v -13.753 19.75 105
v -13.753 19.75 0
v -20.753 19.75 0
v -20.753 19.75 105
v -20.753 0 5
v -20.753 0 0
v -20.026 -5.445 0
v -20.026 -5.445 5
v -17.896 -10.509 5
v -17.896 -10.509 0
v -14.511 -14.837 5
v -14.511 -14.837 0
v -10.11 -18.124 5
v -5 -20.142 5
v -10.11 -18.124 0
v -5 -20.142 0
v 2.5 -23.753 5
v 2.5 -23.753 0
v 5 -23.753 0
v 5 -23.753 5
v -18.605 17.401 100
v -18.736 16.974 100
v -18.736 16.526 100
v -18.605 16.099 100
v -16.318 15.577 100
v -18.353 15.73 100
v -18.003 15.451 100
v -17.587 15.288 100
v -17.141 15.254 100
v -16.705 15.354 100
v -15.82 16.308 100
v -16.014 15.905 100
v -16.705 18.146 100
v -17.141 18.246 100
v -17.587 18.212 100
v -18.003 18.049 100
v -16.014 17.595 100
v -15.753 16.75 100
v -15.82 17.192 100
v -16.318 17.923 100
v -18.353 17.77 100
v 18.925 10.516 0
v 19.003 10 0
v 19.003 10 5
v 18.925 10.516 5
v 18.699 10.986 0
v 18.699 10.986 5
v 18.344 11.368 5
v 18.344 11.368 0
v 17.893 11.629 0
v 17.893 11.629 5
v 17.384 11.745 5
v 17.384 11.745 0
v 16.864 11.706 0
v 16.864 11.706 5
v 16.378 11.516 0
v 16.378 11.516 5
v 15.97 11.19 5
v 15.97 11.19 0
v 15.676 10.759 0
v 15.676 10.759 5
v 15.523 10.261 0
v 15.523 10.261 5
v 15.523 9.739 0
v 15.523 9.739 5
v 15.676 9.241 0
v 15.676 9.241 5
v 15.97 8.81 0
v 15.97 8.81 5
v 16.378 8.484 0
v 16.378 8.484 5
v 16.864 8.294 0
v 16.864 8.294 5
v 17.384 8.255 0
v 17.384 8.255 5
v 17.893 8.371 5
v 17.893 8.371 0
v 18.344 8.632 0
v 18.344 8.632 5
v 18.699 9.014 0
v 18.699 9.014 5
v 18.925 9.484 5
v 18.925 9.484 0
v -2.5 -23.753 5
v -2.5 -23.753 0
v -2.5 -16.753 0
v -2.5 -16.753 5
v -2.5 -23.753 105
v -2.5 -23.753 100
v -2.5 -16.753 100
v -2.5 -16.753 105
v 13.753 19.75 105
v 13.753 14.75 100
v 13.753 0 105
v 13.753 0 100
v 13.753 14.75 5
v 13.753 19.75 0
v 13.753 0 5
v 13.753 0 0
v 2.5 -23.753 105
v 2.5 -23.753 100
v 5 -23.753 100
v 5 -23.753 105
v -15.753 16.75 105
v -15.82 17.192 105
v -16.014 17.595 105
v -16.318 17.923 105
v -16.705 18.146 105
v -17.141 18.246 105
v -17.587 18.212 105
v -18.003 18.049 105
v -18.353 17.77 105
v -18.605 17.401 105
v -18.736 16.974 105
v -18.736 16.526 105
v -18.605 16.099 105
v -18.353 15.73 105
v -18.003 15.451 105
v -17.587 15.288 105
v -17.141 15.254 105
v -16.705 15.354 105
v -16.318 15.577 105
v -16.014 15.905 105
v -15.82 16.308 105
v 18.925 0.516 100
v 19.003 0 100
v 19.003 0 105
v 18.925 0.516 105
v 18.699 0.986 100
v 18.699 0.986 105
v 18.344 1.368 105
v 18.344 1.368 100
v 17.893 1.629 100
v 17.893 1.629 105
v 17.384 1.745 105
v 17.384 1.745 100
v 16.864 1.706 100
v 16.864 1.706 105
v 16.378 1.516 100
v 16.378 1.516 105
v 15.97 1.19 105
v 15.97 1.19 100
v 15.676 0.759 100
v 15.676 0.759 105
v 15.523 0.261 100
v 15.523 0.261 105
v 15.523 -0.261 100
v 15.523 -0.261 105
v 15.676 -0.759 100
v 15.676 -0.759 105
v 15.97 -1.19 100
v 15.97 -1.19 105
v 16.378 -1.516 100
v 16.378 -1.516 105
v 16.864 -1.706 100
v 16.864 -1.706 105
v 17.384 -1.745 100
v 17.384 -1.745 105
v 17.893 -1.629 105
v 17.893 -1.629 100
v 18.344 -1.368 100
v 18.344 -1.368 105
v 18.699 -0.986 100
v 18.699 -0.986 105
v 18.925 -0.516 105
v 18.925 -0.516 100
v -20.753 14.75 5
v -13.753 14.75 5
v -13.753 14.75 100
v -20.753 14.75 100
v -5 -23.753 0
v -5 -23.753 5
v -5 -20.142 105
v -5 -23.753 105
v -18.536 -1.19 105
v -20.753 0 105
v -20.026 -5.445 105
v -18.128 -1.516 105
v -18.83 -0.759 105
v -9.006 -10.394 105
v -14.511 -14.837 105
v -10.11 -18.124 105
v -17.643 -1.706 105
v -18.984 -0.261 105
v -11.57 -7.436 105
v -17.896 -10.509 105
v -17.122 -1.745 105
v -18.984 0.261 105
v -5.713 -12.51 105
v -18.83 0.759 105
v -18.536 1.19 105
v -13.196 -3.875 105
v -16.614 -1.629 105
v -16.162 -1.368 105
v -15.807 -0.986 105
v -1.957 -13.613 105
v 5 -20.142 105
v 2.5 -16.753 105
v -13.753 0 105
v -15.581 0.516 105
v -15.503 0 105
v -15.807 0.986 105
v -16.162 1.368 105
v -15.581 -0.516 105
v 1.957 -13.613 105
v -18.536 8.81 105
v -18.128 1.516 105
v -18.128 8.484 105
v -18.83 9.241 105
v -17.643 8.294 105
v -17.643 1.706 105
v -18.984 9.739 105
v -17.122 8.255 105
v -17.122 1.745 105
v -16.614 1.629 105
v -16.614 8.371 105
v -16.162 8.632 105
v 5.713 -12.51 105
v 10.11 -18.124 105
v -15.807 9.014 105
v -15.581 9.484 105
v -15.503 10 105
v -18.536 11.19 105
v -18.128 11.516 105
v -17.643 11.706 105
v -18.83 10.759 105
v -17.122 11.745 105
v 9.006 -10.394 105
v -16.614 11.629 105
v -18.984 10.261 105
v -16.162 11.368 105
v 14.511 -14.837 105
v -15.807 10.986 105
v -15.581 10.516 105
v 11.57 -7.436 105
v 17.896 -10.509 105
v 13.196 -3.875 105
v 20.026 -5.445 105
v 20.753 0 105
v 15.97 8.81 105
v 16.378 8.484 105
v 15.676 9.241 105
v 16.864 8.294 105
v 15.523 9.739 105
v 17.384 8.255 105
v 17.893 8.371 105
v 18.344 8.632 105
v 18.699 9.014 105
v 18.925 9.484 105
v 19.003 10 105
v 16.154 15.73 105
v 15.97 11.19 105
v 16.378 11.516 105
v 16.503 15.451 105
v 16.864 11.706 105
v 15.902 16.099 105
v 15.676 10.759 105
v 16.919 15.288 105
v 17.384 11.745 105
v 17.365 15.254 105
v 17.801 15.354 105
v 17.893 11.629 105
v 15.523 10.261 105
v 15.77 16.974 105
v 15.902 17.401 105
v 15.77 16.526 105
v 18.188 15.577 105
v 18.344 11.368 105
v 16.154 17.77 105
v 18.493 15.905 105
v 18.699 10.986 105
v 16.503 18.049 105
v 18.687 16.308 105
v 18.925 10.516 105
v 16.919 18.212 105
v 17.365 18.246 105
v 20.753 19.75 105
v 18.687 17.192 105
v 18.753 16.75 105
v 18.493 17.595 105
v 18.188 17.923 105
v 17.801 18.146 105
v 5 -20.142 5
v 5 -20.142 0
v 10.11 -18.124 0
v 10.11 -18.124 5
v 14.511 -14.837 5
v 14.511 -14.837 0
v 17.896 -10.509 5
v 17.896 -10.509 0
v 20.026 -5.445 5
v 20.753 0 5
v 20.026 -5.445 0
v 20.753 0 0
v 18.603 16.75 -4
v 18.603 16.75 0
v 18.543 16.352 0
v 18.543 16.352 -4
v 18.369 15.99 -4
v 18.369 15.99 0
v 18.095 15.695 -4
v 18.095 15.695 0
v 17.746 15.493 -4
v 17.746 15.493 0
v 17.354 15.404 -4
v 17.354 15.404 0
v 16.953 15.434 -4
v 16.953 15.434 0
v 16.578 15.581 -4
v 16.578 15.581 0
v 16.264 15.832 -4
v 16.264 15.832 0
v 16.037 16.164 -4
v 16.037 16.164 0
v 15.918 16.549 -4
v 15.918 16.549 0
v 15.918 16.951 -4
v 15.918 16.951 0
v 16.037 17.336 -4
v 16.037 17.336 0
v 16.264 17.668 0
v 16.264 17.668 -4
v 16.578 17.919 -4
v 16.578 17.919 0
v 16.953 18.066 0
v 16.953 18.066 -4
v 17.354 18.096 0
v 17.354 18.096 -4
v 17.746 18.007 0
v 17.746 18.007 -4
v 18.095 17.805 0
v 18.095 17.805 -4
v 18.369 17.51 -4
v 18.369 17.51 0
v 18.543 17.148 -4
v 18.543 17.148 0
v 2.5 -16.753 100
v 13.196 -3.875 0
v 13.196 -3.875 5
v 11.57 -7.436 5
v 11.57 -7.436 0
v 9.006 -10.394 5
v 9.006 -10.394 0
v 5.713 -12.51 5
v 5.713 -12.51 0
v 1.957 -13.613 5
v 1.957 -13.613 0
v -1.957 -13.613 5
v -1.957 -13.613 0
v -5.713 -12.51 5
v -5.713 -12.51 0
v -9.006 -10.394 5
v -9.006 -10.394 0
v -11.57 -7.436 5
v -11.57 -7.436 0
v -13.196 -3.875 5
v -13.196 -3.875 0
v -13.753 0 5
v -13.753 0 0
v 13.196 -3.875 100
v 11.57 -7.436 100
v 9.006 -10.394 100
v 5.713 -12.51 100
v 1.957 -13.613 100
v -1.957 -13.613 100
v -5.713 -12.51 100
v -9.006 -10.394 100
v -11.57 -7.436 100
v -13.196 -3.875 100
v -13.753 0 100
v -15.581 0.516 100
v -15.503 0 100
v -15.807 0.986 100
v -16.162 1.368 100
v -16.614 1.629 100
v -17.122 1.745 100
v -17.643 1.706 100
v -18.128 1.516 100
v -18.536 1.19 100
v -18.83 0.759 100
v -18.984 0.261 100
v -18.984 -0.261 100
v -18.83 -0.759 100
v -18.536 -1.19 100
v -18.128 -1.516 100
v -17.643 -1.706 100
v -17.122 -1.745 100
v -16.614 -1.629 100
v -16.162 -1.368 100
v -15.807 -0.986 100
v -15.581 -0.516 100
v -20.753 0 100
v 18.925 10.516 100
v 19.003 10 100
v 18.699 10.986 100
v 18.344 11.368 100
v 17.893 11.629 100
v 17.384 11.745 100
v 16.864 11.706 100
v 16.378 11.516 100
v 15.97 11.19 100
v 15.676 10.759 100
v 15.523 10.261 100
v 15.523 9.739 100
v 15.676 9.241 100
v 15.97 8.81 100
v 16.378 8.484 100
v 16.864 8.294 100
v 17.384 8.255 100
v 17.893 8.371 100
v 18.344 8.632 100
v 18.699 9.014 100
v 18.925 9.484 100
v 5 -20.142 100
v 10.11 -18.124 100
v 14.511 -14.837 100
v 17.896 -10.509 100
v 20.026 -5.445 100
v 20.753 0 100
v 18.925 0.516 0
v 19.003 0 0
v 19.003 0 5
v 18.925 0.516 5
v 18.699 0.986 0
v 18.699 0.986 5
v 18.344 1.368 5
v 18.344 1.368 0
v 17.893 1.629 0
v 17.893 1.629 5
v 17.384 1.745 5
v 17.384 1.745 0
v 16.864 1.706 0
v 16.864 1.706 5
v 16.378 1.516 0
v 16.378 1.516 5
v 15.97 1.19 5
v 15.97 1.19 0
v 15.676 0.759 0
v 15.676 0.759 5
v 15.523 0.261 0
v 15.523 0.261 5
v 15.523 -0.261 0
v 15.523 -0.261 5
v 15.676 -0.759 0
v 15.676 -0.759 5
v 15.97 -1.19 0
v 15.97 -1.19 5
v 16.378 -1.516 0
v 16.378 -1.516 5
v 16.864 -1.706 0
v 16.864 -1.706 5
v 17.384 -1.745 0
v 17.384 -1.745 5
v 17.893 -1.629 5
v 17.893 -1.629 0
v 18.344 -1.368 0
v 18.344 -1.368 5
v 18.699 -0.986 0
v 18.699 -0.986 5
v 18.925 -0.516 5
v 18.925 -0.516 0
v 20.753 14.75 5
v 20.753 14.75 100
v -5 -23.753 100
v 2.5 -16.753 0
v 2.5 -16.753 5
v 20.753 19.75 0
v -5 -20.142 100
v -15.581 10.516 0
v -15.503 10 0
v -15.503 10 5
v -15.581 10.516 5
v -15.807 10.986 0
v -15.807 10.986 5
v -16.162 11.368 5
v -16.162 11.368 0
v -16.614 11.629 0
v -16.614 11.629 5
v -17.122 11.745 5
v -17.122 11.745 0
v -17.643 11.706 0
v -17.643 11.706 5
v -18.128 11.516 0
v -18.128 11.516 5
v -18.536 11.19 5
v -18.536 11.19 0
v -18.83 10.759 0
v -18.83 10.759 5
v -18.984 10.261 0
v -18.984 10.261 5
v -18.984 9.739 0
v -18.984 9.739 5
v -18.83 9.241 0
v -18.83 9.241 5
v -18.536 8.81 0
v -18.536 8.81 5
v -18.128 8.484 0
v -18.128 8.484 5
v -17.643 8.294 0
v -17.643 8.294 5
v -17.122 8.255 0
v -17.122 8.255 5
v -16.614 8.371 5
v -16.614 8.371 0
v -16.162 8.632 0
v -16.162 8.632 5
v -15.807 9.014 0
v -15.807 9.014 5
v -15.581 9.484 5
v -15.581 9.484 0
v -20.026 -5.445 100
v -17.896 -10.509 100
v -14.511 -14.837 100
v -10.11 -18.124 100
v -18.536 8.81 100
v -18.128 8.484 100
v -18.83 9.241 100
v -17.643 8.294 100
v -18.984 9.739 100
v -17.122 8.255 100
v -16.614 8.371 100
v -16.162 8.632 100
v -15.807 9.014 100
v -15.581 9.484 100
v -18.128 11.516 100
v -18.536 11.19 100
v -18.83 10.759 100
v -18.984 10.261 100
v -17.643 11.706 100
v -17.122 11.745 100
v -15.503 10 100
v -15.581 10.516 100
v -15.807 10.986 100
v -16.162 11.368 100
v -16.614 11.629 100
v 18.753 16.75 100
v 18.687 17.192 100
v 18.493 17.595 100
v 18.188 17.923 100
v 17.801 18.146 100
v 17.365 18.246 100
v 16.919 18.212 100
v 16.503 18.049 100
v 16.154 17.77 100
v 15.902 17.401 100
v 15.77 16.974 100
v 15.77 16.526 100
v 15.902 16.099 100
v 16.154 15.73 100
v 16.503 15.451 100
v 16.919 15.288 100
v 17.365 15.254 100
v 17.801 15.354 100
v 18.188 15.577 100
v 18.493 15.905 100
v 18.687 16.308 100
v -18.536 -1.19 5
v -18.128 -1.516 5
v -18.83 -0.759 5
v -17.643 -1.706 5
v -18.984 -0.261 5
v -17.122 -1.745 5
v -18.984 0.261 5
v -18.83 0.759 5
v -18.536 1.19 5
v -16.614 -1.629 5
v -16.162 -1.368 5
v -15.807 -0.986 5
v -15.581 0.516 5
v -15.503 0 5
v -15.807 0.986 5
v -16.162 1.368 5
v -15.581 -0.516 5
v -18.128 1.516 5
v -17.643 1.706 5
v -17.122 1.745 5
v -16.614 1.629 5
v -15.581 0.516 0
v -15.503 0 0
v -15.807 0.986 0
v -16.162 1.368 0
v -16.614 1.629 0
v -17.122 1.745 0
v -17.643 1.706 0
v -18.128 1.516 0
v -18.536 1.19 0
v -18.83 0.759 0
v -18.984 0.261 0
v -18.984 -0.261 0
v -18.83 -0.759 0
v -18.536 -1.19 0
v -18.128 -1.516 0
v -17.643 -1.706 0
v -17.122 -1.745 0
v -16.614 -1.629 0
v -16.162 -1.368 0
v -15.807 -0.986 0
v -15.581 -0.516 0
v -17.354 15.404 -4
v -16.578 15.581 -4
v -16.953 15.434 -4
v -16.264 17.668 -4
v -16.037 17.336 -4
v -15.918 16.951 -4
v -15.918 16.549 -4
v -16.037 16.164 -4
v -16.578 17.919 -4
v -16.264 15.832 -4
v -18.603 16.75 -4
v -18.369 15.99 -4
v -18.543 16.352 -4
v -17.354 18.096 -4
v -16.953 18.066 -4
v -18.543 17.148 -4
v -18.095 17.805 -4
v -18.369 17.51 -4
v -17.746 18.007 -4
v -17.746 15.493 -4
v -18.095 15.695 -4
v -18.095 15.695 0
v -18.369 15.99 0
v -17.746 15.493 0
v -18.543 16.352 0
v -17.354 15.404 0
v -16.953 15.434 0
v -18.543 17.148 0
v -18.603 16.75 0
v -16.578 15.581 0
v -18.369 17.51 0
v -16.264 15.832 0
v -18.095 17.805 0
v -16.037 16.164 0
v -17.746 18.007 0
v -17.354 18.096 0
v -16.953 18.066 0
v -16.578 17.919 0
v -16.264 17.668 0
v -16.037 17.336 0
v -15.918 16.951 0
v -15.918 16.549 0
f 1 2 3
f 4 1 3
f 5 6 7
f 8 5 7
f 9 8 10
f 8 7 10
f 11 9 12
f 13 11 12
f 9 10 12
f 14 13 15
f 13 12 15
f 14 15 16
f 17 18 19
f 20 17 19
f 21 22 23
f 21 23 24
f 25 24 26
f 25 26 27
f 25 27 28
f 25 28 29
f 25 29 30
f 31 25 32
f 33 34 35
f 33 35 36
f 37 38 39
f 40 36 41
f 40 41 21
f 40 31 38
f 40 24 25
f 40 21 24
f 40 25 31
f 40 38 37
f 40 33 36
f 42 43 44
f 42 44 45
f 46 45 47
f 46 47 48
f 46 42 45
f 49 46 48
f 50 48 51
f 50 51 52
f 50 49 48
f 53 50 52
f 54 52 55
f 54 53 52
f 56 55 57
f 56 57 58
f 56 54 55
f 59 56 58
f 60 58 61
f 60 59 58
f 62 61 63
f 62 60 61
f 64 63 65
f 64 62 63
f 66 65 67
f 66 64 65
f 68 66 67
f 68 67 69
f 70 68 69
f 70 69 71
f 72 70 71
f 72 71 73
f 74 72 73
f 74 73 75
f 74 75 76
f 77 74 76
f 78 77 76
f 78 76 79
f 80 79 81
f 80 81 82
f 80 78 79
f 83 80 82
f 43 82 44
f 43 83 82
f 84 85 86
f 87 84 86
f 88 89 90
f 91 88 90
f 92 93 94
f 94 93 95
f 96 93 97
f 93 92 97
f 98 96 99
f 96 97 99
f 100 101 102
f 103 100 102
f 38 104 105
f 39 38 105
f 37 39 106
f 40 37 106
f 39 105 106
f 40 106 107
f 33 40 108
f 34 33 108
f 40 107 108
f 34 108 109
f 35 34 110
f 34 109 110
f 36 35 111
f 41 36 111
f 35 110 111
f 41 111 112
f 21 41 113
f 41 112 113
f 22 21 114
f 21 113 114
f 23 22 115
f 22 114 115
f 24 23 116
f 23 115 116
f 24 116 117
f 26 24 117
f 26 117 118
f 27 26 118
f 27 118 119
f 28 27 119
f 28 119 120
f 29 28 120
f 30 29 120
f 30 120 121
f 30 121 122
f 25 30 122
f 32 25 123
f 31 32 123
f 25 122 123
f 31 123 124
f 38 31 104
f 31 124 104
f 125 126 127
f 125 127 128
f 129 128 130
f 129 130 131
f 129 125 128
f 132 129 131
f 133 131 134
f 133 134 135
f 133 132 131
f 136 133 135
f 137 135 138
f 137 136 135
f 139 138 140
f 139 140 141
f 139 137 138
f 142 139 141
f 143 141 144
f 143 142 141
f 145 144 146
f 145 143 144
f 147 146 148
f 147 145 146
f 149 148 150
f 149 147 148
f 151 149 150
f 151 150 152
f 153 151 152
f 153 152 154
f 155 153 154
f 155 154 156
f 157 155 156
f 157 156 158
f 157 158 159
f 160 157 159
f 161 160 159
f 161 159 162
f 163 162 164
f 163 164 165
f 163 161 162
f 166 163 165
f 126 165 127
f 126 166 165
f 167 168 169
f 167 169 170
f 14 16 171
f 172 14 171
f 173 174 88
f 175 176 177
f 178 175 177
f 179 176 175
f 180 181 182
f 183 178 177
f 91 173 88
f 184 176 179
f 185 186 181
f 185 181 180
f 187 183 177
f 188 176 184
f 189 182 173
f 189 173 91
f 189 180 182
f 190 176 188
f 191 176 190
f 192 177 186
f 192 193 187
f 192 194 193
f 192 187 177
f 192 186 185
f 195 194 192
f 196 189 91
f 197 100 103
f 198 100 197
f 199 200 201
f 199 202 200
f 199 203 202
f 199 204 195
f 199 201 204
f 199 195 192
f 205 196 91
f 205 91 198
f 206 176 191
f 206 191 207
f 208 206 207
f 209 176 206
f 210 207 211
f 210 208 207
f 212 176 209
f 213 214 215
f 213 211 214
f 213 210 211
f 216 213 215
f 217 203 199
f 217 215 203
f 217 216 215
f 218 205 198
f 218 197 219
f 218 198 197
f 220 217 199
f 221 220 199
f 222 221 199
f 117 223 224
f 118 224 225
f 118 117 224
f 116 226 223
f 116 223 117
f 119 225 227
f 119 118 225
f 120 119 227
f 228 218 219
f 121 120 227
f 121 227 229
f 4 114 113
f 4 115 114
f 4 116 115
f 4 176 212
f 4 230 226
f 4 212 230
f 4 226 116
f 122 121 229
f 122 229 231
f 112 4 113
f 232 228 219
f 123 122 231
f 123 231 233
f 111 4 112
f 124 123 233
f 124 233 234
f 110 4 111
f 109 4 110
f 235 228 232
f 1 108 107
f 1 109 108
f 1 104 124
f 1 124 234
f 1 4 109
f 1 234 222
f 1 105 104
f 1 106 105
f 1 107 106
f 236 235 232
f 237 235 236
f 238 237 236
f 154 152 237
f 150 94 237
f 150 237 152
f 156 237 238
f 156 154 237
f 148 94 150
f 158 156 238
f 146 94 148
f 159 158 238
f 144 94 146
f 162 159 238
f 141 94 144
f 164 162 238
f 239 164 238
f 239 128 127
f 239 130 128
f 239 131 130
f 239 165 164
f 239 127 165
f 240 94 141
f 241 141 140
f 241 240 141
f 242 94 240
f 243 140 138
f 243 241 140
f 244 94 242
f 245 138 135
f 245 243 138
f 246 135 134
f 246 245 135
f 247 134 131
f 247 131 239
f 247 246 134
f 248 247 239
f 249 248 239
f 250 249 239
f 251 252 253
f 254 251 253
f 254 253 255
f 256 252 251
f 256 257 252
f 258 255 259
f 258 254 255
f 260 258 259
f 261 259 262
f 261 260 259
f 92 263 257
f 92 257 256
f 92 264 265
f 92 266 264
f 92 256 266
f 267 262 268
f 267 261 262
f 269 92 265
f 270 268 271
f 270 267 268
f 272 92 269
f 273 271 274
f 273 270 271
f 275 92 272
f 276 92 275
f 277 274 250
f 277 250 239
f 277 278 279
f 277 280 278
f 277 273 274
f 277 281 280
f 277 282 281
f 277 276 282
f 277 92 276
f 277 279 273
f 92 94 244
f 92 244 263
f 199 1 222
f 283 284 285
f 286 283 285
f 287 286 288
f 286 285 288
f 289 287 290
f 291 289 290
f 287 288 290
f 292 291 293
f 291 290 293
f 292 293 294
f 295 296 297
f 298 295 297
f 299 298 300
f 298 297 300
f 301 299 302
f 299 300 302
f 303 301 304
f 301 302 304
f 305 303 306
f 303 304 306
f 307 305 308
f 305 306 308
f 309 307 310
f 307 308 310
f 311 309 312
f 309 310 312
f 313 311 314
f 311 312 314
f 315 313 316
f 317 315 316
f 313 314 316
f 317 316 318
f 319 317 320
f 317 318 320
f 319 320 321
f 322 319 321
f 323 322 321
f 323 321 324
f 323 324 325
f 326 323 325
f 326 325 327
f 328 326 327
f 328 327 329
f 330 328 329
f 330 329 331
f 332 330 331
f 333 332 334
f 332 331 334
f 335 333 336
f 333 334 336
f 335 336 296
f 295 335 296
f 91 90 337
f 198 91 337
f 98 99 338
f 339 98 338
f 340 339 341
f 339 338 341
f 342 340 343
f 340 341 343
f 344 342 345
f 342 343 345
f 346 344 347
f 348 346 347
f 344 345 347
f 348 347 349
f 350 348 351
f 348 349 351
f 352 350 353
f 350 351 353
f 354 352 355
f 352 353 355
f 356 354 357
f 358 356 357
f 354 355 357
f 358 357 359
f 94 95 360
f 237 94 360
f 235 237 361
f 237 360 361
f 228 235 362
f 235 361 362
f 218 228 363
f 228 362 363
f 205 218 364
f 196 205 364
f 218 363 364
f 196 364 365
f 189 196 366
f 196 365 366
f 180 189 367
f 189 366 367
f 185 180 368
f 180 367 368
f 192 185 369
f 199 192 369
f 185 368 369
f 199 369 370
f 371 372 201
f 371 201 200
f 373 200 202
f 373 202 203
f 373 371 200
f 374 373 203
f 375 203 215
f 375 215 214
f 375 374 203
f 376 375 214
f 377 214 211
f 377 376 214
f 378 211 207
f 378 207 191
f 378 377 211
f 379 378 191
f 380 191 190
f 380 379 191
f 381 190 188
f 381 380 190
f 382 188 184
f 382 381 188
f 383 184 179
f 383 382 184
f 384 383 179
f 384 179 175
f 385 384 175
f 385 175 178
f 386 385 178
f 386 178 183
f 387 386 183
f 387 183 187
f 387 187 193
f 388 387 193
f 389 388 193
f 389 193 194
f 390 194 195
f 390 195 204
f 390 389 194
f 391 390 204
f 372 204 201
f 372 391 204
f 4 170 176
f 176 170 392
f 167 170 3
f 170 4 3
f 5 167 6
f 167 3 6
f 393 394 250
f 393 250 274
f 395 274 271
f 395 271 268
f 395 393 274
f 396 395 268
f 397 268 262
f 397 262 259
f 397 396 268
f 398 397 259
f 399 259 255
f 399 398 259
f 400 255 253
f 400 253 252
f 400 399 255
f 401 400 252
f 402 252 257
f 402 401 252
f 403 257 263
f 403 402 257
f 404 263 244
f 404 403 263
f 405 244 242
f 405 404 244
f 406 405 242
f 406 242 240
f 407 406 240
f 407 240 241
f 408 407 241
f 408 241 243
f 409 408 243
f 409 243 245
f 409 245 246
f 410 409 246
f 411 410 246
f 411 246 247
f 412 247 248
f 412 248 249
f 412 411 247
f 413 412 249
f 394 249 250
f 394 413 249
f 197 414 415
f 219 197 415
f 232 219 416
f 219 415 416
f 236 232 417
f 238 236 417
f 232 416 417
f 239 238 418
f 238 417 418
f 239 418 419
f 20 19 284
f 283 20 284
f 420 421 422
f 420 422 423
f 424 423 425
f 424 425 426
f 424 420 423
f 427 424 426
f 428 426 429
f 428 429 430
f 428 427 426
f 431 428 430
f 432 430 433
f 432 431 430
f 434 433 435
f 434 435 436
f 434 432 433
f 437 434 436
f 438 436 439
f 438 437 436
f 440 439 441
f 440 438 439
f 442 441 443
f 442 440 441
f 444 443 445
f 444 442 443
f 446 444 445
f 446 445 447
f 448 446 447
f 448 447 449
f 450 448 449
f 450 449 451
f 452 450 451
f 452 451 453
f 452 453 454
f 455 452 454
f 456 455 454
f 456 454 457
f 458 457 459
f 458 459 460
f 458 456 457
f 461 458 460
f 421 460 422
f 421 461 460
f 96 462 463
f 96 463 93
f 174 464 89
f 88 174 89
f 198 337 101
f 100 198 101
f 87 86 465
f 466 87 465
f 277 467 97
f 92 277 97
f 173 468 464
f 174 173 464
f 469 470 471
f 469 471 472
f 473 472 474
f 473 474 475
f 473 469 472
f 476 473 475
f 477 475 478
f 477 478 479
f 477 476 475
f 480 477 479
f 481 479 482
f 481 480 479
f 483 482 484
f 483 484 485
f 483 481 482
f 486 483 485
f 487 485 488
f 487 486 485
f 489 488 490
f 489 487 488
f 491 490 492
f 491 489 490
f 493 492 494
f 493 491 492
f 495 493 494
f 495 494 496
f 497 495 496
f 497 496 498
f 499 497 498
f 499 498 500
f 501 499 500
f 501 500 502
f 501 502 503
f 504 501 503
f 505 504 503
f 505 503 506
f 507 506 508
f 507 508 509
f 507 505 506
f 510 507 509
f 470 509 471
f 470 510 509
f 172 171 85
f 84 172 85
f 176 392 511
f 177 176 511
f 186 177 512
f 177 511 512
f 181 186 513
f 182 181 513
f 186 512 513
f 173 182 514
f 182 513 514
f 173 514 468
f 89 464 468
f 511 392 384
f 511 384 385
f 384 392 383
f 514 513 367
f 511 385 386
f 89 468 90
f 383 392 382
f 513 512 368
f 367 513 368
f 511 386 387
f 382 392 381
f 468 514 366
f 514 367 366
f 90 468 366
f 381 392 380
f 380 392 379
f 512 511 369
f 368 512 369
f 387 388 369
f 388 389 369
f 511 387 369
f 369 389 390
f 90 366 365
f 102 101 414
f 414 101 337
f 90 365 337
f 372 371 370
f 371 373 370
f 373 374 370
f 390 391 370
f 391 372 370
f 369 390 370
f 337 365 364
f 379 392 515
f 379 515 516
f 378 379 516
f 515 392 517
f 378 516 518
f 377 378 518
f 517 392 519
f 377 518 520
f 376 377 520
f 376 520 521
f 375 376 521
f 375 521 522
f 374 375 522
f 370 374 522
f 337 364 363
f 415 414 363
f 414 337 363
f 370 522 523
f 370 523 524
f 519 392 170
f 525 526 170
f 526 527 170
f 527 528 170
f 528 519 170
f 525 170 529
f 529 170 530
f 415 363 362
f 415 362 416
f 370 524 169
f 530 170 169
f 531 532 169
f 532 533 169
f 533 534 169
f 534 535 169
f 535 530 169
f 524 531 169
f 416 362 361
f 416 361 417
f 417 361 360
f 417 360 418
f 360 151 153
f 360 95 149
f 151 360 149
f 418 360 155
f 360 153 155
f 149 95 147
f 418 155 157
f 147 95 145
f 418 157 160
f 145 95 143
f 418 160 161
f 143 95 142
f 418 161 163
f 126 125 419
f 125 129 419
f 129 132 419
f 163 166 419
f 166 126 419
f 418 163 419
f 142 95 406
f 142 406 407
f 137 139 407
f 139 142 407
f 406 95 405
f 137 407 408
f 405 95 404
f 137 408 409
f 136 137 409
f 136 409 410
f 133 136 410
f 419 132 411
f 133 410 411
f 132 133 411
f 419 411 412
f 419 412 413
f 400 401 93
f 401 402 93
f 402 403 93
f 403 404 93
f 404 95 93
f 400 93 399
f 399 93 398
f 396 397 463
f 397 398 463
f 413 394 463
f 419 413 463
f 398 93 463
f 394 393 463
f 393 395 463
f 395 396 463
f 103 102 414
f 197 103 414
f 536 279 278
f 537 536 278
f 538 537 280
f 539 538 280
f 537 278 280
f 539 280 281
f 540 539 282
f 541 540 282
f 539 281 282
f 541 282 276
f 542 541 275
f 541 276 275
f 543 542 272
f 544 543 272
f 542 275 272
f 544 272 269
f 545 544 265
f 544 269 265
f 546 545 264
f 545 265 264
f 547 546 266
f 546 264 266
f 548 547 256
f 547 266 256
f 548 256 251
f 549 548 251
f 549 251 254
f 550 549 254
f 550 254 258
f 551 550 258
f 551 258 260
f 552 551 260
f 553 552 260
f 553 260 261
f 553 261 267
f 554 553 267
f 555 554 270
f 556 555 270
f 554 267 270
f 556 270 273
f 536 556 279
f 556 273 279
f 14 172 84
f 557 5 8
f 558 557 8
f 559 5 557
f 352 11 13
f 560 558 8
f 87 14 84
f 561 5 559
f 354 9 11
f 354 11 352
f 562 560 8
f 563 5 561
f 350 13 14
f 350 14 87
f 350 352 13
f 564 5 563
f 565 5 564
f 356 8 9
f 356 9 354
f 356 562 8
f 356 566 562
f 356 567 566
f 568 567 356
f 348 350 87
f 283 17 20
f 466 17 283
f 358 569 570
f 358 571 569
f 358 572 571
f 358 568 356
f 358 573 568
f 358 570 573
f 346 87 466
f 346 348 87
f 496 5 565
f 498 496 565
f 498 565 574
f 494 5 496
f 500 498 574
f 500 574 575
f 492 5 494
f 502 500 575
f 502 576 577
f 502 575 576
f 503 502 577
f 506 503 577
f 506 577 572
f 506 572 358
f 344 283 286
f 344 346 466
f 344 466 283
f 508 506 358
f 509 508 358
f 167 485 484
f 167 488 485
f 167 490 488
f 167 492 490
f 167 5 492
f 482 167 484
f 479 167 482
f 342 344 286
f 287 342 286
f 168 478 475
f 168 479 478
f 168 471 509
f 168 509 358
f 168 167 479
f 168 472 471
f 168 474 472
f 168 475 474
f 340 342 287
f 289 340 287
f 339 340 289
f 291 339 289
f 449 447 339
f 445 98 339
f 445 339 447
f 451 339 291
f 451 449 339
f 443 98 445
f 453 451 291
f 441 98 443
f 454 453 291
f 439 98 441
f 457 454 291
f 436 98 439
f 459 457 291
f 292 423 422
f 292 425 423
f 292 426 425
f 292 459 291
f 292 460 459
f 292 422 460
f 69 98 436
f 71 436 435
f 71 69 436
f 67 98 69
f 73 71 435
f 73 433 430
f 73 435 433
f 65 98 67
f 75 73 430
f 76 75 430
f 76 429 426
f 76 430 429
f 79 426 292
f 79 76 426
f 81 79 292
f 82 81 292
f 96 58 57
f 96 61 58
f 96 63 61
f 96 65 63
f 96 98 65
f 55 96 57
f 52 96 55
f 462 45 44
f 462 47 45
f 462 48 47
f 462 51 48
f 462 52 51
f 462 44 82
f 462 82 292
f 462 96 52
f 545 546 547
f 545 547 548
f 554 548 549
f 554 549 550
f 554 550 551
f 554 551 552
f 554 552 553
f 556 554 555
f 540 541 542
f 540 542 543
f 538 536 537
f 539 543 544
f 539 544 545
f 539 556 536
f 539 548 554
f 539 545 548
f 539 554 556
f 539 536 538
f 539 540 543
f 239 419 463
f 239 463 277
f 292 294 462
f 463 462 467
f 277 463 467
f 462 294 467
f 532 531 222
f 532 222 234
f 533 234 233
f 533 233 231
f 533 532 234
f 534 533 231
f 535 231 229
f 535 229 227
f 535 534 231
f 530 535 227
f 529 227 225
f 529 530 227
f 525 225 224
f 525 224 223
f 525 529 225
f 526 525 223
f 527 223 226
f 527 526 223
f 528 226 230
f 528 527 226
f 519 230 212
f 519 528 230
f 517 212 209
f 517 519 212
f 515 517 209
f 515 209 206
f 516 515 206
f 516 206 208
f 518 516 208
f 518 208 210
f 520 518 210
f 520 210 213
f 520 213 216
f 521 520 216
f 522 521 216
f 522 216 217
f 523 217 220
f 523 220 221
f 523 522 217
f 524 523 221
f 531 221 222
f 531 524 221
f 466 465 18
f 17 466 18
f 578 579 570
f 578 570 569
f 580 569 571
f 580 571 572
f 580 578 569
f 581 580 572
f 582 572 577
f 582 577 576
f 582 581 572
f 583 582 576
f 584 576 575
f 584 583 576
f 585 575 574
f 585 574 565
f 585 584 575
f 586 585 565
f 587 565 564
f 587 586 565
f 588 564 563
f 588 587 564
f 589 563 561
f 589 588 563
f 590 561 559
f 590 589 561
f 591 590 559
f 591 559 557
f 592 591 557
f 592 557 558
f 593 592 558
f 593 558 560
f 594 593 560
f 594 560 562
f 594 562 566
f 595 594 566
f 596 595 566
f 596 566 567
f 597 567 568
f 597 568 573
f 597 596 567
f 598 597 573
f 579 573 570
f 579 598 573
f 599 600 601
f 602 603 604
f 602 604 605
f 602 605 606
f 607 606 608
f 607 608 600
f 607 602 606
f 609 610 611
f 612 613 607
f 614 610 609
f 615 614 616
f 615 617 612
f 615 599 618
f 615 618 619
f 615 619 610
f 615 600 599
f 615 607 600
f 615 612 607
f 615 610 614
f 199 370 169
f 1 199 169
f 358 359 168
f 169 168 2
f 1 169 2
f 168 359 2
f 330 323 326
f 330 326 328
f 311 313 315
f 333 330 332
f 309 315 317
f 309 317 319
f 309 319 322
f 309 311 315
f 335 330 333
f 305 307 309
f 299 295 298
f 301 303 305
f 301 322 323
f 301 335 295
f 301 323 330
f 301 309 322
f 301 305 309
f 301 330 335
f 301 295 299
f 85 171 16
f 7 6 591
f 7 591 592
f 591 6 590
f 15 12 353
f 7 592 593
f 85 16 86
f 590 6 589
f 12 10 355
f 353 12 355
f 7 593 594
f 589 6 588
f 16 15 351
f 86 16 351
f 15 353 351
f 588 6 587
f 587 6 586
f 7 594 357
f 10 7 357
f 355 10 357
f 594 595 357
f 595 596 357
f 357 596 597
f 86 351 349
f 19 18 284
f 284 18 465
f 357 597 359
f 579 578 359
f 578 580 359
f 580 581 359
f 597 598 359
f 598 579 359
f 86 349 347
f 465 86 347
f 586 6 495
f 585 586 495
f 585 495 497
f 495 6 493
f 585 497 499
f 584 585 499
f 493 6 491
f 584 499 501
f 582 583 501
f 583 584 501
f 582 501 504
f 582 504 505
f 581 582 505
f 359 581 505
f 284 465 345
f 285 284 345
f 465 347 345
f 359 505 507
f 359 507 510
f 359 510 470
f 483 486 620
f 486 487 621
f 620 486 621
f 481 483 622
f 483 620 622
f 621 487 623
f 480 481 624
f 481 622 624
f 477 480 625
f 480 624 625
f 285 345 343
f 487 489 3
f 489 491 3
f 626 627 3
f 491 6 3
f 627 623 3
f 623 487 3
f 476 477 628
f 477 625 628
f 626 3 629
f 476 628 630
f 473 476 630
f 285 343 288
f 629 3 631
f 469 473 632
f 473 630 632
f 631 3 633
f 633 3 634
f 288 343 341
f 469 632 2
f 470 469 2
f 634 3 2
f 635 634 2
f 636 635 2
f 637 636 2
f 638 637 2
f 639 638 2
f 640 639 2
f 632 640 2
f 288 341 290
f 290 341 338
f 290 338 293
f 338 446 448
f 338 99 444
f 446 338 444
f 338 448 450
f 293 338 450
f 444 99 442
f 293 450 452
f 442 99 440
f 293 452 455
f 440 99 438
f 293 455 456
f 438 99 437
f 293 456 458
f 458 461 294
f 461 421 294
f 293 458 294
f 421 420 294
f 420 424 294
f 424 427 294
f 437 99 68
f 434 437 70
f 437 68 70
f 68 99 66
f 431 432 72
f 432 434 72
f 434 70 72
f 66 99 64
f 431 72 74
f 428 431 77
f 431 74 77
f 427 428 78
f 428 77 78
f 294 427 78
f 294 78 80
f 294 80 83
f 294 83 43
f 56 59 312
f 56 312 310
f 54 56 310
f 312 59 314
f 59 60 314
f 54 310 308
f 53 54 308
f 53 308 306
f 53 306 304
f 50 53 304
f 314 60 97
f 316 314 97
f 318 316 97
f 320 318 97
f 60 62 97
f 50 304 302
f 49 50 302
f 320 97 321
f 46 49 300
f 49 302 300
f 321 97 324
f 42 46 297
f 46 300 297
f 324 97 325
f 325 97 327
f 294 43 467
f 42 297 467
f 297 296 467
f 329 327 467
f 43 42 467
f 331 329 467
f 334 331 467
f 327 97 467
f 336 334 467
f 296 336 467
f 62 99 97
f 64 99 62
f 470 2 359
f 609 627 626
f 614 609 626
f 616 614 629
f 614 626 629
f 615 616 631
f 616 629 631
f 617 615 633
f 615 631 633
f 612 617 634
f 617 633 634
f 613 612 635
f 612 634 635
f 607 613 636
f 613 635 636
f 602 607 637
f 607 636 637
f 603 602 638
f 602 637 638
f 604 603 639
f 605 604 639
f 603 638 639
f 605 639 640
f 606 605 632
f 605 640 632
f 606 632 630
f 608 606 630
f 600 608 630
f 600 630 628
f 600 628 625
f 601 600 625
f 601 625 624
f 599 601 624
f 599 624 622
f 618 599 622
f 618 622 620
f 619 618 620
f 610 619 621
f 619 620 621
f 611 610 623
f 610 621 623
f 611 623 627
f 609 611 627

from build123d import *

# Parameters (mm, degrees)
SKETCH1_R           = 1.75
BOSS_EXTRUDE1_DEPTH = 5
SKETCH2_R           = 1.35
BOSS_EXTRUDE2_DEPTH = 4
SKETCH4_W           = 7
SKETCH4_H           = 5
BOSS_EXTRUDE3_DEPTH = 105
BOSS_EXTRUDE4_START = -5
SKETCH5_R           = 1.75
BOSS_EXTRUDE4_DEPTH = 5
SKETCH6_R           = 1.35
CUT_EXTRUDE1_DEPTH  = 5
SKETCH8_R           = 1.5
CUT_EXTRUDE3_DEPTH  = 5


with BuildPart() as part:
    # Sketch1 → Boss-Extrude1 (new body)
    with BuildSketch(Plane.XY):
        with BuildLine():
            Line((-20.753194099, 19.75), (-20.753194099, 0))
            ThreePointArc((-20.753194099, 0), (-16.34718685, -12.785325472), (-5, -20.141873431))
            Line((-5, -20.141873431), (-5, -23.753194099))
            Line((-5, -23.753194099), (-2.5, -23.753194099))
            Line((-2.5, -23.753194099), (-2.5, -16.753194099))
            Line((-2.5, -16.753194099), (2.5, -16.753194099))
            Line((2.5, -16.753194099), (2.5, -23.753194099))
            Line((2.5, -23.753194099), (5, -23.753194099))
            Line((5, -23.753194099), (5, -20.141873431))
            ThreePointArc((5, -20.141873431), (16.34718685, -12.785325472), (20.753194099, 0))
            Line((20.753194099, 0), (20.753194099, 19.75))
            Line((20.753194099, 19.75), (13.753194099, 19.75))
            Line((13.753194099, 19.75), (13.753194099, 0))
            ThreePointArc((13.753194099, 0), (0, -13.753194099), (-13.753194099, 0))
            Line((-13.753194099, 0), (-13.753194099, 19.75))
            Line((-13.753194099, 19.75), (-20.753194099, 19.75))
        make_face()
        with Locations((-17.253194099, 10)):
            Circle(SKETCH1_R, mode=Mode.SUBTRACT)
        with Locations((-17.253194099, 0)):
            Circle(SKETCH1_R, mode=Mode.SUBTRACT)
        with Locations((17.253194099, 0)):
            Circle(SKETCH1_R, mode=Mode.SUBTRACT)
        with Locations((17.253194099, 10)):
            Circle(SKETCH1_R, mode=Mode.SUBTRACT)
    extrude(amount=BOSS_EXTRUDE1_DEPTH)

    # Sketch2 → Boss-Extrude2 (add)
    with BuildSketch(Plane(origin=(0, 0, 0), x_dir=(-1, 0, 0), z_dir=(0, 0, -1))):
        with Locations((17.253194099, 16.75)):
            Circle(SKETCH2_R)
        with Locations(Location((-17.253194099, 16.75, 0), (0, 0, 180))):
            Circle(SKETCH2_R)
    extrude(amount=BOSS_EXTRUDE2_DEPTH)

    # Sketch4 → Boss-Extrude3 (add)
    with BuildSketch(Plane(origin=(0, 0, 0), x_dir=(-1, 0, 0), z_dir=(0, 0, -1))):
        with Locations((17.253194099, 17.25)):
            Rectangle(SKETCH4_W, SKETCH4_H)
        with Locations((-17.253194099, 17.25)):
            Rectangle(SKETCH4_W, SKETCH4_H)
    extrude(amount=-BOSS_EXTRUDE3_DEPTH)

    # Sketch5 → Boss-Extrude4 (add)
    with BuildSketch(Plane.XY.offset(105).offset(BOSS_EXTRUDE4_START)):
        with BuildLine():
            Line((20.753194099, 14.75), (13.753194099, 14.75))
            Line((13.753194099, 14.75), (13.753194099, 0))
            ThreePointArc((13.753194099, 0), (0, -13.753194099), (-13.753194099, 0))
            Line((-13.753194099, 0), (-13.753194099, 14.75))
            Line((-13.753194099, 14.75), (-20.753194099, 14.75))
            Line((-20.753194099, 14.75), (-20.753194099, 0))
            ThreePointArc((-20.753194099, 0), (-16.34718685, -12.785325472), (-5, -20.141873431))
            Line((-5, -20.141873431), (-5, -23.753194099))
            Line((-5, -23.753194099), (-2.5, -23.753194099))
            Line((-2.5, -23.753194099), (-2.5, -16.753194099))
            Line((-2.5, -16.753194099), (2.5, -16.753194099))
            Line((2.5, -16.753194099), (2.5, -23.753194099))
            Line((2.5, -23.753194099), (5, -23.753194099))
            Line((5, -23.753194099), (5, -20.141873431))
            ThreePointArc((5, -20.141873431), (16.34718685, -12.785325472), (20.753194099, 0))
            Line((20.753194099, 0), (20.753194099, 14.75))
        make_face()
        with Locations((17.253194099, 10)):
            Circle(SKETCH5_R, mode=Mode.SUBTRACT)
        with Locations((-17.253194099, 10)):
            Circle(SKETCH5_R, mode=Mode.SUBTRACT)
        with Locations((-17.253194099, 0)):
            Circle(SKETCH5_R, mode=Mode.SUBTRACT)
        with Locations((17.253194099, 0)):
            Circle(SKETCH5_R, mode=Mode.SUBTRACT)
    extrude(amount=BOSS_EXTRUDE4_DEPTH)

    # Sketch6 → Cut-Extrude1 (cut)
    with BuildSketch(Plane.XY.offset(105)):
        with Locations((17.253194099, 16.75)):
            Circle(SKETCH6_R)
        with Locations(Location((-17.253194099, 16.75, 0), (0, 0, 180))):
            Circle(SKETCH6_R)
    extrude(amount=-CUT_EXTRUDE1_DEPTH, mode=Mode.SUBTRACT)

    # Sketch8 → Cut-Extrude3 (cut)
    with BuildSketch(Plane.XY.offset(105)):
        with Locations((17.253194099, 16.75)):
            Circle(SKETCH8_R)
        with Locations((-17.253194099, 16.75)):
            Circle(SKETCH8_R)
    extrude(amount=-CUT_EXTRUDE3_DEPTH, mode=Mode.SUBTRACT)


solid = part.part
